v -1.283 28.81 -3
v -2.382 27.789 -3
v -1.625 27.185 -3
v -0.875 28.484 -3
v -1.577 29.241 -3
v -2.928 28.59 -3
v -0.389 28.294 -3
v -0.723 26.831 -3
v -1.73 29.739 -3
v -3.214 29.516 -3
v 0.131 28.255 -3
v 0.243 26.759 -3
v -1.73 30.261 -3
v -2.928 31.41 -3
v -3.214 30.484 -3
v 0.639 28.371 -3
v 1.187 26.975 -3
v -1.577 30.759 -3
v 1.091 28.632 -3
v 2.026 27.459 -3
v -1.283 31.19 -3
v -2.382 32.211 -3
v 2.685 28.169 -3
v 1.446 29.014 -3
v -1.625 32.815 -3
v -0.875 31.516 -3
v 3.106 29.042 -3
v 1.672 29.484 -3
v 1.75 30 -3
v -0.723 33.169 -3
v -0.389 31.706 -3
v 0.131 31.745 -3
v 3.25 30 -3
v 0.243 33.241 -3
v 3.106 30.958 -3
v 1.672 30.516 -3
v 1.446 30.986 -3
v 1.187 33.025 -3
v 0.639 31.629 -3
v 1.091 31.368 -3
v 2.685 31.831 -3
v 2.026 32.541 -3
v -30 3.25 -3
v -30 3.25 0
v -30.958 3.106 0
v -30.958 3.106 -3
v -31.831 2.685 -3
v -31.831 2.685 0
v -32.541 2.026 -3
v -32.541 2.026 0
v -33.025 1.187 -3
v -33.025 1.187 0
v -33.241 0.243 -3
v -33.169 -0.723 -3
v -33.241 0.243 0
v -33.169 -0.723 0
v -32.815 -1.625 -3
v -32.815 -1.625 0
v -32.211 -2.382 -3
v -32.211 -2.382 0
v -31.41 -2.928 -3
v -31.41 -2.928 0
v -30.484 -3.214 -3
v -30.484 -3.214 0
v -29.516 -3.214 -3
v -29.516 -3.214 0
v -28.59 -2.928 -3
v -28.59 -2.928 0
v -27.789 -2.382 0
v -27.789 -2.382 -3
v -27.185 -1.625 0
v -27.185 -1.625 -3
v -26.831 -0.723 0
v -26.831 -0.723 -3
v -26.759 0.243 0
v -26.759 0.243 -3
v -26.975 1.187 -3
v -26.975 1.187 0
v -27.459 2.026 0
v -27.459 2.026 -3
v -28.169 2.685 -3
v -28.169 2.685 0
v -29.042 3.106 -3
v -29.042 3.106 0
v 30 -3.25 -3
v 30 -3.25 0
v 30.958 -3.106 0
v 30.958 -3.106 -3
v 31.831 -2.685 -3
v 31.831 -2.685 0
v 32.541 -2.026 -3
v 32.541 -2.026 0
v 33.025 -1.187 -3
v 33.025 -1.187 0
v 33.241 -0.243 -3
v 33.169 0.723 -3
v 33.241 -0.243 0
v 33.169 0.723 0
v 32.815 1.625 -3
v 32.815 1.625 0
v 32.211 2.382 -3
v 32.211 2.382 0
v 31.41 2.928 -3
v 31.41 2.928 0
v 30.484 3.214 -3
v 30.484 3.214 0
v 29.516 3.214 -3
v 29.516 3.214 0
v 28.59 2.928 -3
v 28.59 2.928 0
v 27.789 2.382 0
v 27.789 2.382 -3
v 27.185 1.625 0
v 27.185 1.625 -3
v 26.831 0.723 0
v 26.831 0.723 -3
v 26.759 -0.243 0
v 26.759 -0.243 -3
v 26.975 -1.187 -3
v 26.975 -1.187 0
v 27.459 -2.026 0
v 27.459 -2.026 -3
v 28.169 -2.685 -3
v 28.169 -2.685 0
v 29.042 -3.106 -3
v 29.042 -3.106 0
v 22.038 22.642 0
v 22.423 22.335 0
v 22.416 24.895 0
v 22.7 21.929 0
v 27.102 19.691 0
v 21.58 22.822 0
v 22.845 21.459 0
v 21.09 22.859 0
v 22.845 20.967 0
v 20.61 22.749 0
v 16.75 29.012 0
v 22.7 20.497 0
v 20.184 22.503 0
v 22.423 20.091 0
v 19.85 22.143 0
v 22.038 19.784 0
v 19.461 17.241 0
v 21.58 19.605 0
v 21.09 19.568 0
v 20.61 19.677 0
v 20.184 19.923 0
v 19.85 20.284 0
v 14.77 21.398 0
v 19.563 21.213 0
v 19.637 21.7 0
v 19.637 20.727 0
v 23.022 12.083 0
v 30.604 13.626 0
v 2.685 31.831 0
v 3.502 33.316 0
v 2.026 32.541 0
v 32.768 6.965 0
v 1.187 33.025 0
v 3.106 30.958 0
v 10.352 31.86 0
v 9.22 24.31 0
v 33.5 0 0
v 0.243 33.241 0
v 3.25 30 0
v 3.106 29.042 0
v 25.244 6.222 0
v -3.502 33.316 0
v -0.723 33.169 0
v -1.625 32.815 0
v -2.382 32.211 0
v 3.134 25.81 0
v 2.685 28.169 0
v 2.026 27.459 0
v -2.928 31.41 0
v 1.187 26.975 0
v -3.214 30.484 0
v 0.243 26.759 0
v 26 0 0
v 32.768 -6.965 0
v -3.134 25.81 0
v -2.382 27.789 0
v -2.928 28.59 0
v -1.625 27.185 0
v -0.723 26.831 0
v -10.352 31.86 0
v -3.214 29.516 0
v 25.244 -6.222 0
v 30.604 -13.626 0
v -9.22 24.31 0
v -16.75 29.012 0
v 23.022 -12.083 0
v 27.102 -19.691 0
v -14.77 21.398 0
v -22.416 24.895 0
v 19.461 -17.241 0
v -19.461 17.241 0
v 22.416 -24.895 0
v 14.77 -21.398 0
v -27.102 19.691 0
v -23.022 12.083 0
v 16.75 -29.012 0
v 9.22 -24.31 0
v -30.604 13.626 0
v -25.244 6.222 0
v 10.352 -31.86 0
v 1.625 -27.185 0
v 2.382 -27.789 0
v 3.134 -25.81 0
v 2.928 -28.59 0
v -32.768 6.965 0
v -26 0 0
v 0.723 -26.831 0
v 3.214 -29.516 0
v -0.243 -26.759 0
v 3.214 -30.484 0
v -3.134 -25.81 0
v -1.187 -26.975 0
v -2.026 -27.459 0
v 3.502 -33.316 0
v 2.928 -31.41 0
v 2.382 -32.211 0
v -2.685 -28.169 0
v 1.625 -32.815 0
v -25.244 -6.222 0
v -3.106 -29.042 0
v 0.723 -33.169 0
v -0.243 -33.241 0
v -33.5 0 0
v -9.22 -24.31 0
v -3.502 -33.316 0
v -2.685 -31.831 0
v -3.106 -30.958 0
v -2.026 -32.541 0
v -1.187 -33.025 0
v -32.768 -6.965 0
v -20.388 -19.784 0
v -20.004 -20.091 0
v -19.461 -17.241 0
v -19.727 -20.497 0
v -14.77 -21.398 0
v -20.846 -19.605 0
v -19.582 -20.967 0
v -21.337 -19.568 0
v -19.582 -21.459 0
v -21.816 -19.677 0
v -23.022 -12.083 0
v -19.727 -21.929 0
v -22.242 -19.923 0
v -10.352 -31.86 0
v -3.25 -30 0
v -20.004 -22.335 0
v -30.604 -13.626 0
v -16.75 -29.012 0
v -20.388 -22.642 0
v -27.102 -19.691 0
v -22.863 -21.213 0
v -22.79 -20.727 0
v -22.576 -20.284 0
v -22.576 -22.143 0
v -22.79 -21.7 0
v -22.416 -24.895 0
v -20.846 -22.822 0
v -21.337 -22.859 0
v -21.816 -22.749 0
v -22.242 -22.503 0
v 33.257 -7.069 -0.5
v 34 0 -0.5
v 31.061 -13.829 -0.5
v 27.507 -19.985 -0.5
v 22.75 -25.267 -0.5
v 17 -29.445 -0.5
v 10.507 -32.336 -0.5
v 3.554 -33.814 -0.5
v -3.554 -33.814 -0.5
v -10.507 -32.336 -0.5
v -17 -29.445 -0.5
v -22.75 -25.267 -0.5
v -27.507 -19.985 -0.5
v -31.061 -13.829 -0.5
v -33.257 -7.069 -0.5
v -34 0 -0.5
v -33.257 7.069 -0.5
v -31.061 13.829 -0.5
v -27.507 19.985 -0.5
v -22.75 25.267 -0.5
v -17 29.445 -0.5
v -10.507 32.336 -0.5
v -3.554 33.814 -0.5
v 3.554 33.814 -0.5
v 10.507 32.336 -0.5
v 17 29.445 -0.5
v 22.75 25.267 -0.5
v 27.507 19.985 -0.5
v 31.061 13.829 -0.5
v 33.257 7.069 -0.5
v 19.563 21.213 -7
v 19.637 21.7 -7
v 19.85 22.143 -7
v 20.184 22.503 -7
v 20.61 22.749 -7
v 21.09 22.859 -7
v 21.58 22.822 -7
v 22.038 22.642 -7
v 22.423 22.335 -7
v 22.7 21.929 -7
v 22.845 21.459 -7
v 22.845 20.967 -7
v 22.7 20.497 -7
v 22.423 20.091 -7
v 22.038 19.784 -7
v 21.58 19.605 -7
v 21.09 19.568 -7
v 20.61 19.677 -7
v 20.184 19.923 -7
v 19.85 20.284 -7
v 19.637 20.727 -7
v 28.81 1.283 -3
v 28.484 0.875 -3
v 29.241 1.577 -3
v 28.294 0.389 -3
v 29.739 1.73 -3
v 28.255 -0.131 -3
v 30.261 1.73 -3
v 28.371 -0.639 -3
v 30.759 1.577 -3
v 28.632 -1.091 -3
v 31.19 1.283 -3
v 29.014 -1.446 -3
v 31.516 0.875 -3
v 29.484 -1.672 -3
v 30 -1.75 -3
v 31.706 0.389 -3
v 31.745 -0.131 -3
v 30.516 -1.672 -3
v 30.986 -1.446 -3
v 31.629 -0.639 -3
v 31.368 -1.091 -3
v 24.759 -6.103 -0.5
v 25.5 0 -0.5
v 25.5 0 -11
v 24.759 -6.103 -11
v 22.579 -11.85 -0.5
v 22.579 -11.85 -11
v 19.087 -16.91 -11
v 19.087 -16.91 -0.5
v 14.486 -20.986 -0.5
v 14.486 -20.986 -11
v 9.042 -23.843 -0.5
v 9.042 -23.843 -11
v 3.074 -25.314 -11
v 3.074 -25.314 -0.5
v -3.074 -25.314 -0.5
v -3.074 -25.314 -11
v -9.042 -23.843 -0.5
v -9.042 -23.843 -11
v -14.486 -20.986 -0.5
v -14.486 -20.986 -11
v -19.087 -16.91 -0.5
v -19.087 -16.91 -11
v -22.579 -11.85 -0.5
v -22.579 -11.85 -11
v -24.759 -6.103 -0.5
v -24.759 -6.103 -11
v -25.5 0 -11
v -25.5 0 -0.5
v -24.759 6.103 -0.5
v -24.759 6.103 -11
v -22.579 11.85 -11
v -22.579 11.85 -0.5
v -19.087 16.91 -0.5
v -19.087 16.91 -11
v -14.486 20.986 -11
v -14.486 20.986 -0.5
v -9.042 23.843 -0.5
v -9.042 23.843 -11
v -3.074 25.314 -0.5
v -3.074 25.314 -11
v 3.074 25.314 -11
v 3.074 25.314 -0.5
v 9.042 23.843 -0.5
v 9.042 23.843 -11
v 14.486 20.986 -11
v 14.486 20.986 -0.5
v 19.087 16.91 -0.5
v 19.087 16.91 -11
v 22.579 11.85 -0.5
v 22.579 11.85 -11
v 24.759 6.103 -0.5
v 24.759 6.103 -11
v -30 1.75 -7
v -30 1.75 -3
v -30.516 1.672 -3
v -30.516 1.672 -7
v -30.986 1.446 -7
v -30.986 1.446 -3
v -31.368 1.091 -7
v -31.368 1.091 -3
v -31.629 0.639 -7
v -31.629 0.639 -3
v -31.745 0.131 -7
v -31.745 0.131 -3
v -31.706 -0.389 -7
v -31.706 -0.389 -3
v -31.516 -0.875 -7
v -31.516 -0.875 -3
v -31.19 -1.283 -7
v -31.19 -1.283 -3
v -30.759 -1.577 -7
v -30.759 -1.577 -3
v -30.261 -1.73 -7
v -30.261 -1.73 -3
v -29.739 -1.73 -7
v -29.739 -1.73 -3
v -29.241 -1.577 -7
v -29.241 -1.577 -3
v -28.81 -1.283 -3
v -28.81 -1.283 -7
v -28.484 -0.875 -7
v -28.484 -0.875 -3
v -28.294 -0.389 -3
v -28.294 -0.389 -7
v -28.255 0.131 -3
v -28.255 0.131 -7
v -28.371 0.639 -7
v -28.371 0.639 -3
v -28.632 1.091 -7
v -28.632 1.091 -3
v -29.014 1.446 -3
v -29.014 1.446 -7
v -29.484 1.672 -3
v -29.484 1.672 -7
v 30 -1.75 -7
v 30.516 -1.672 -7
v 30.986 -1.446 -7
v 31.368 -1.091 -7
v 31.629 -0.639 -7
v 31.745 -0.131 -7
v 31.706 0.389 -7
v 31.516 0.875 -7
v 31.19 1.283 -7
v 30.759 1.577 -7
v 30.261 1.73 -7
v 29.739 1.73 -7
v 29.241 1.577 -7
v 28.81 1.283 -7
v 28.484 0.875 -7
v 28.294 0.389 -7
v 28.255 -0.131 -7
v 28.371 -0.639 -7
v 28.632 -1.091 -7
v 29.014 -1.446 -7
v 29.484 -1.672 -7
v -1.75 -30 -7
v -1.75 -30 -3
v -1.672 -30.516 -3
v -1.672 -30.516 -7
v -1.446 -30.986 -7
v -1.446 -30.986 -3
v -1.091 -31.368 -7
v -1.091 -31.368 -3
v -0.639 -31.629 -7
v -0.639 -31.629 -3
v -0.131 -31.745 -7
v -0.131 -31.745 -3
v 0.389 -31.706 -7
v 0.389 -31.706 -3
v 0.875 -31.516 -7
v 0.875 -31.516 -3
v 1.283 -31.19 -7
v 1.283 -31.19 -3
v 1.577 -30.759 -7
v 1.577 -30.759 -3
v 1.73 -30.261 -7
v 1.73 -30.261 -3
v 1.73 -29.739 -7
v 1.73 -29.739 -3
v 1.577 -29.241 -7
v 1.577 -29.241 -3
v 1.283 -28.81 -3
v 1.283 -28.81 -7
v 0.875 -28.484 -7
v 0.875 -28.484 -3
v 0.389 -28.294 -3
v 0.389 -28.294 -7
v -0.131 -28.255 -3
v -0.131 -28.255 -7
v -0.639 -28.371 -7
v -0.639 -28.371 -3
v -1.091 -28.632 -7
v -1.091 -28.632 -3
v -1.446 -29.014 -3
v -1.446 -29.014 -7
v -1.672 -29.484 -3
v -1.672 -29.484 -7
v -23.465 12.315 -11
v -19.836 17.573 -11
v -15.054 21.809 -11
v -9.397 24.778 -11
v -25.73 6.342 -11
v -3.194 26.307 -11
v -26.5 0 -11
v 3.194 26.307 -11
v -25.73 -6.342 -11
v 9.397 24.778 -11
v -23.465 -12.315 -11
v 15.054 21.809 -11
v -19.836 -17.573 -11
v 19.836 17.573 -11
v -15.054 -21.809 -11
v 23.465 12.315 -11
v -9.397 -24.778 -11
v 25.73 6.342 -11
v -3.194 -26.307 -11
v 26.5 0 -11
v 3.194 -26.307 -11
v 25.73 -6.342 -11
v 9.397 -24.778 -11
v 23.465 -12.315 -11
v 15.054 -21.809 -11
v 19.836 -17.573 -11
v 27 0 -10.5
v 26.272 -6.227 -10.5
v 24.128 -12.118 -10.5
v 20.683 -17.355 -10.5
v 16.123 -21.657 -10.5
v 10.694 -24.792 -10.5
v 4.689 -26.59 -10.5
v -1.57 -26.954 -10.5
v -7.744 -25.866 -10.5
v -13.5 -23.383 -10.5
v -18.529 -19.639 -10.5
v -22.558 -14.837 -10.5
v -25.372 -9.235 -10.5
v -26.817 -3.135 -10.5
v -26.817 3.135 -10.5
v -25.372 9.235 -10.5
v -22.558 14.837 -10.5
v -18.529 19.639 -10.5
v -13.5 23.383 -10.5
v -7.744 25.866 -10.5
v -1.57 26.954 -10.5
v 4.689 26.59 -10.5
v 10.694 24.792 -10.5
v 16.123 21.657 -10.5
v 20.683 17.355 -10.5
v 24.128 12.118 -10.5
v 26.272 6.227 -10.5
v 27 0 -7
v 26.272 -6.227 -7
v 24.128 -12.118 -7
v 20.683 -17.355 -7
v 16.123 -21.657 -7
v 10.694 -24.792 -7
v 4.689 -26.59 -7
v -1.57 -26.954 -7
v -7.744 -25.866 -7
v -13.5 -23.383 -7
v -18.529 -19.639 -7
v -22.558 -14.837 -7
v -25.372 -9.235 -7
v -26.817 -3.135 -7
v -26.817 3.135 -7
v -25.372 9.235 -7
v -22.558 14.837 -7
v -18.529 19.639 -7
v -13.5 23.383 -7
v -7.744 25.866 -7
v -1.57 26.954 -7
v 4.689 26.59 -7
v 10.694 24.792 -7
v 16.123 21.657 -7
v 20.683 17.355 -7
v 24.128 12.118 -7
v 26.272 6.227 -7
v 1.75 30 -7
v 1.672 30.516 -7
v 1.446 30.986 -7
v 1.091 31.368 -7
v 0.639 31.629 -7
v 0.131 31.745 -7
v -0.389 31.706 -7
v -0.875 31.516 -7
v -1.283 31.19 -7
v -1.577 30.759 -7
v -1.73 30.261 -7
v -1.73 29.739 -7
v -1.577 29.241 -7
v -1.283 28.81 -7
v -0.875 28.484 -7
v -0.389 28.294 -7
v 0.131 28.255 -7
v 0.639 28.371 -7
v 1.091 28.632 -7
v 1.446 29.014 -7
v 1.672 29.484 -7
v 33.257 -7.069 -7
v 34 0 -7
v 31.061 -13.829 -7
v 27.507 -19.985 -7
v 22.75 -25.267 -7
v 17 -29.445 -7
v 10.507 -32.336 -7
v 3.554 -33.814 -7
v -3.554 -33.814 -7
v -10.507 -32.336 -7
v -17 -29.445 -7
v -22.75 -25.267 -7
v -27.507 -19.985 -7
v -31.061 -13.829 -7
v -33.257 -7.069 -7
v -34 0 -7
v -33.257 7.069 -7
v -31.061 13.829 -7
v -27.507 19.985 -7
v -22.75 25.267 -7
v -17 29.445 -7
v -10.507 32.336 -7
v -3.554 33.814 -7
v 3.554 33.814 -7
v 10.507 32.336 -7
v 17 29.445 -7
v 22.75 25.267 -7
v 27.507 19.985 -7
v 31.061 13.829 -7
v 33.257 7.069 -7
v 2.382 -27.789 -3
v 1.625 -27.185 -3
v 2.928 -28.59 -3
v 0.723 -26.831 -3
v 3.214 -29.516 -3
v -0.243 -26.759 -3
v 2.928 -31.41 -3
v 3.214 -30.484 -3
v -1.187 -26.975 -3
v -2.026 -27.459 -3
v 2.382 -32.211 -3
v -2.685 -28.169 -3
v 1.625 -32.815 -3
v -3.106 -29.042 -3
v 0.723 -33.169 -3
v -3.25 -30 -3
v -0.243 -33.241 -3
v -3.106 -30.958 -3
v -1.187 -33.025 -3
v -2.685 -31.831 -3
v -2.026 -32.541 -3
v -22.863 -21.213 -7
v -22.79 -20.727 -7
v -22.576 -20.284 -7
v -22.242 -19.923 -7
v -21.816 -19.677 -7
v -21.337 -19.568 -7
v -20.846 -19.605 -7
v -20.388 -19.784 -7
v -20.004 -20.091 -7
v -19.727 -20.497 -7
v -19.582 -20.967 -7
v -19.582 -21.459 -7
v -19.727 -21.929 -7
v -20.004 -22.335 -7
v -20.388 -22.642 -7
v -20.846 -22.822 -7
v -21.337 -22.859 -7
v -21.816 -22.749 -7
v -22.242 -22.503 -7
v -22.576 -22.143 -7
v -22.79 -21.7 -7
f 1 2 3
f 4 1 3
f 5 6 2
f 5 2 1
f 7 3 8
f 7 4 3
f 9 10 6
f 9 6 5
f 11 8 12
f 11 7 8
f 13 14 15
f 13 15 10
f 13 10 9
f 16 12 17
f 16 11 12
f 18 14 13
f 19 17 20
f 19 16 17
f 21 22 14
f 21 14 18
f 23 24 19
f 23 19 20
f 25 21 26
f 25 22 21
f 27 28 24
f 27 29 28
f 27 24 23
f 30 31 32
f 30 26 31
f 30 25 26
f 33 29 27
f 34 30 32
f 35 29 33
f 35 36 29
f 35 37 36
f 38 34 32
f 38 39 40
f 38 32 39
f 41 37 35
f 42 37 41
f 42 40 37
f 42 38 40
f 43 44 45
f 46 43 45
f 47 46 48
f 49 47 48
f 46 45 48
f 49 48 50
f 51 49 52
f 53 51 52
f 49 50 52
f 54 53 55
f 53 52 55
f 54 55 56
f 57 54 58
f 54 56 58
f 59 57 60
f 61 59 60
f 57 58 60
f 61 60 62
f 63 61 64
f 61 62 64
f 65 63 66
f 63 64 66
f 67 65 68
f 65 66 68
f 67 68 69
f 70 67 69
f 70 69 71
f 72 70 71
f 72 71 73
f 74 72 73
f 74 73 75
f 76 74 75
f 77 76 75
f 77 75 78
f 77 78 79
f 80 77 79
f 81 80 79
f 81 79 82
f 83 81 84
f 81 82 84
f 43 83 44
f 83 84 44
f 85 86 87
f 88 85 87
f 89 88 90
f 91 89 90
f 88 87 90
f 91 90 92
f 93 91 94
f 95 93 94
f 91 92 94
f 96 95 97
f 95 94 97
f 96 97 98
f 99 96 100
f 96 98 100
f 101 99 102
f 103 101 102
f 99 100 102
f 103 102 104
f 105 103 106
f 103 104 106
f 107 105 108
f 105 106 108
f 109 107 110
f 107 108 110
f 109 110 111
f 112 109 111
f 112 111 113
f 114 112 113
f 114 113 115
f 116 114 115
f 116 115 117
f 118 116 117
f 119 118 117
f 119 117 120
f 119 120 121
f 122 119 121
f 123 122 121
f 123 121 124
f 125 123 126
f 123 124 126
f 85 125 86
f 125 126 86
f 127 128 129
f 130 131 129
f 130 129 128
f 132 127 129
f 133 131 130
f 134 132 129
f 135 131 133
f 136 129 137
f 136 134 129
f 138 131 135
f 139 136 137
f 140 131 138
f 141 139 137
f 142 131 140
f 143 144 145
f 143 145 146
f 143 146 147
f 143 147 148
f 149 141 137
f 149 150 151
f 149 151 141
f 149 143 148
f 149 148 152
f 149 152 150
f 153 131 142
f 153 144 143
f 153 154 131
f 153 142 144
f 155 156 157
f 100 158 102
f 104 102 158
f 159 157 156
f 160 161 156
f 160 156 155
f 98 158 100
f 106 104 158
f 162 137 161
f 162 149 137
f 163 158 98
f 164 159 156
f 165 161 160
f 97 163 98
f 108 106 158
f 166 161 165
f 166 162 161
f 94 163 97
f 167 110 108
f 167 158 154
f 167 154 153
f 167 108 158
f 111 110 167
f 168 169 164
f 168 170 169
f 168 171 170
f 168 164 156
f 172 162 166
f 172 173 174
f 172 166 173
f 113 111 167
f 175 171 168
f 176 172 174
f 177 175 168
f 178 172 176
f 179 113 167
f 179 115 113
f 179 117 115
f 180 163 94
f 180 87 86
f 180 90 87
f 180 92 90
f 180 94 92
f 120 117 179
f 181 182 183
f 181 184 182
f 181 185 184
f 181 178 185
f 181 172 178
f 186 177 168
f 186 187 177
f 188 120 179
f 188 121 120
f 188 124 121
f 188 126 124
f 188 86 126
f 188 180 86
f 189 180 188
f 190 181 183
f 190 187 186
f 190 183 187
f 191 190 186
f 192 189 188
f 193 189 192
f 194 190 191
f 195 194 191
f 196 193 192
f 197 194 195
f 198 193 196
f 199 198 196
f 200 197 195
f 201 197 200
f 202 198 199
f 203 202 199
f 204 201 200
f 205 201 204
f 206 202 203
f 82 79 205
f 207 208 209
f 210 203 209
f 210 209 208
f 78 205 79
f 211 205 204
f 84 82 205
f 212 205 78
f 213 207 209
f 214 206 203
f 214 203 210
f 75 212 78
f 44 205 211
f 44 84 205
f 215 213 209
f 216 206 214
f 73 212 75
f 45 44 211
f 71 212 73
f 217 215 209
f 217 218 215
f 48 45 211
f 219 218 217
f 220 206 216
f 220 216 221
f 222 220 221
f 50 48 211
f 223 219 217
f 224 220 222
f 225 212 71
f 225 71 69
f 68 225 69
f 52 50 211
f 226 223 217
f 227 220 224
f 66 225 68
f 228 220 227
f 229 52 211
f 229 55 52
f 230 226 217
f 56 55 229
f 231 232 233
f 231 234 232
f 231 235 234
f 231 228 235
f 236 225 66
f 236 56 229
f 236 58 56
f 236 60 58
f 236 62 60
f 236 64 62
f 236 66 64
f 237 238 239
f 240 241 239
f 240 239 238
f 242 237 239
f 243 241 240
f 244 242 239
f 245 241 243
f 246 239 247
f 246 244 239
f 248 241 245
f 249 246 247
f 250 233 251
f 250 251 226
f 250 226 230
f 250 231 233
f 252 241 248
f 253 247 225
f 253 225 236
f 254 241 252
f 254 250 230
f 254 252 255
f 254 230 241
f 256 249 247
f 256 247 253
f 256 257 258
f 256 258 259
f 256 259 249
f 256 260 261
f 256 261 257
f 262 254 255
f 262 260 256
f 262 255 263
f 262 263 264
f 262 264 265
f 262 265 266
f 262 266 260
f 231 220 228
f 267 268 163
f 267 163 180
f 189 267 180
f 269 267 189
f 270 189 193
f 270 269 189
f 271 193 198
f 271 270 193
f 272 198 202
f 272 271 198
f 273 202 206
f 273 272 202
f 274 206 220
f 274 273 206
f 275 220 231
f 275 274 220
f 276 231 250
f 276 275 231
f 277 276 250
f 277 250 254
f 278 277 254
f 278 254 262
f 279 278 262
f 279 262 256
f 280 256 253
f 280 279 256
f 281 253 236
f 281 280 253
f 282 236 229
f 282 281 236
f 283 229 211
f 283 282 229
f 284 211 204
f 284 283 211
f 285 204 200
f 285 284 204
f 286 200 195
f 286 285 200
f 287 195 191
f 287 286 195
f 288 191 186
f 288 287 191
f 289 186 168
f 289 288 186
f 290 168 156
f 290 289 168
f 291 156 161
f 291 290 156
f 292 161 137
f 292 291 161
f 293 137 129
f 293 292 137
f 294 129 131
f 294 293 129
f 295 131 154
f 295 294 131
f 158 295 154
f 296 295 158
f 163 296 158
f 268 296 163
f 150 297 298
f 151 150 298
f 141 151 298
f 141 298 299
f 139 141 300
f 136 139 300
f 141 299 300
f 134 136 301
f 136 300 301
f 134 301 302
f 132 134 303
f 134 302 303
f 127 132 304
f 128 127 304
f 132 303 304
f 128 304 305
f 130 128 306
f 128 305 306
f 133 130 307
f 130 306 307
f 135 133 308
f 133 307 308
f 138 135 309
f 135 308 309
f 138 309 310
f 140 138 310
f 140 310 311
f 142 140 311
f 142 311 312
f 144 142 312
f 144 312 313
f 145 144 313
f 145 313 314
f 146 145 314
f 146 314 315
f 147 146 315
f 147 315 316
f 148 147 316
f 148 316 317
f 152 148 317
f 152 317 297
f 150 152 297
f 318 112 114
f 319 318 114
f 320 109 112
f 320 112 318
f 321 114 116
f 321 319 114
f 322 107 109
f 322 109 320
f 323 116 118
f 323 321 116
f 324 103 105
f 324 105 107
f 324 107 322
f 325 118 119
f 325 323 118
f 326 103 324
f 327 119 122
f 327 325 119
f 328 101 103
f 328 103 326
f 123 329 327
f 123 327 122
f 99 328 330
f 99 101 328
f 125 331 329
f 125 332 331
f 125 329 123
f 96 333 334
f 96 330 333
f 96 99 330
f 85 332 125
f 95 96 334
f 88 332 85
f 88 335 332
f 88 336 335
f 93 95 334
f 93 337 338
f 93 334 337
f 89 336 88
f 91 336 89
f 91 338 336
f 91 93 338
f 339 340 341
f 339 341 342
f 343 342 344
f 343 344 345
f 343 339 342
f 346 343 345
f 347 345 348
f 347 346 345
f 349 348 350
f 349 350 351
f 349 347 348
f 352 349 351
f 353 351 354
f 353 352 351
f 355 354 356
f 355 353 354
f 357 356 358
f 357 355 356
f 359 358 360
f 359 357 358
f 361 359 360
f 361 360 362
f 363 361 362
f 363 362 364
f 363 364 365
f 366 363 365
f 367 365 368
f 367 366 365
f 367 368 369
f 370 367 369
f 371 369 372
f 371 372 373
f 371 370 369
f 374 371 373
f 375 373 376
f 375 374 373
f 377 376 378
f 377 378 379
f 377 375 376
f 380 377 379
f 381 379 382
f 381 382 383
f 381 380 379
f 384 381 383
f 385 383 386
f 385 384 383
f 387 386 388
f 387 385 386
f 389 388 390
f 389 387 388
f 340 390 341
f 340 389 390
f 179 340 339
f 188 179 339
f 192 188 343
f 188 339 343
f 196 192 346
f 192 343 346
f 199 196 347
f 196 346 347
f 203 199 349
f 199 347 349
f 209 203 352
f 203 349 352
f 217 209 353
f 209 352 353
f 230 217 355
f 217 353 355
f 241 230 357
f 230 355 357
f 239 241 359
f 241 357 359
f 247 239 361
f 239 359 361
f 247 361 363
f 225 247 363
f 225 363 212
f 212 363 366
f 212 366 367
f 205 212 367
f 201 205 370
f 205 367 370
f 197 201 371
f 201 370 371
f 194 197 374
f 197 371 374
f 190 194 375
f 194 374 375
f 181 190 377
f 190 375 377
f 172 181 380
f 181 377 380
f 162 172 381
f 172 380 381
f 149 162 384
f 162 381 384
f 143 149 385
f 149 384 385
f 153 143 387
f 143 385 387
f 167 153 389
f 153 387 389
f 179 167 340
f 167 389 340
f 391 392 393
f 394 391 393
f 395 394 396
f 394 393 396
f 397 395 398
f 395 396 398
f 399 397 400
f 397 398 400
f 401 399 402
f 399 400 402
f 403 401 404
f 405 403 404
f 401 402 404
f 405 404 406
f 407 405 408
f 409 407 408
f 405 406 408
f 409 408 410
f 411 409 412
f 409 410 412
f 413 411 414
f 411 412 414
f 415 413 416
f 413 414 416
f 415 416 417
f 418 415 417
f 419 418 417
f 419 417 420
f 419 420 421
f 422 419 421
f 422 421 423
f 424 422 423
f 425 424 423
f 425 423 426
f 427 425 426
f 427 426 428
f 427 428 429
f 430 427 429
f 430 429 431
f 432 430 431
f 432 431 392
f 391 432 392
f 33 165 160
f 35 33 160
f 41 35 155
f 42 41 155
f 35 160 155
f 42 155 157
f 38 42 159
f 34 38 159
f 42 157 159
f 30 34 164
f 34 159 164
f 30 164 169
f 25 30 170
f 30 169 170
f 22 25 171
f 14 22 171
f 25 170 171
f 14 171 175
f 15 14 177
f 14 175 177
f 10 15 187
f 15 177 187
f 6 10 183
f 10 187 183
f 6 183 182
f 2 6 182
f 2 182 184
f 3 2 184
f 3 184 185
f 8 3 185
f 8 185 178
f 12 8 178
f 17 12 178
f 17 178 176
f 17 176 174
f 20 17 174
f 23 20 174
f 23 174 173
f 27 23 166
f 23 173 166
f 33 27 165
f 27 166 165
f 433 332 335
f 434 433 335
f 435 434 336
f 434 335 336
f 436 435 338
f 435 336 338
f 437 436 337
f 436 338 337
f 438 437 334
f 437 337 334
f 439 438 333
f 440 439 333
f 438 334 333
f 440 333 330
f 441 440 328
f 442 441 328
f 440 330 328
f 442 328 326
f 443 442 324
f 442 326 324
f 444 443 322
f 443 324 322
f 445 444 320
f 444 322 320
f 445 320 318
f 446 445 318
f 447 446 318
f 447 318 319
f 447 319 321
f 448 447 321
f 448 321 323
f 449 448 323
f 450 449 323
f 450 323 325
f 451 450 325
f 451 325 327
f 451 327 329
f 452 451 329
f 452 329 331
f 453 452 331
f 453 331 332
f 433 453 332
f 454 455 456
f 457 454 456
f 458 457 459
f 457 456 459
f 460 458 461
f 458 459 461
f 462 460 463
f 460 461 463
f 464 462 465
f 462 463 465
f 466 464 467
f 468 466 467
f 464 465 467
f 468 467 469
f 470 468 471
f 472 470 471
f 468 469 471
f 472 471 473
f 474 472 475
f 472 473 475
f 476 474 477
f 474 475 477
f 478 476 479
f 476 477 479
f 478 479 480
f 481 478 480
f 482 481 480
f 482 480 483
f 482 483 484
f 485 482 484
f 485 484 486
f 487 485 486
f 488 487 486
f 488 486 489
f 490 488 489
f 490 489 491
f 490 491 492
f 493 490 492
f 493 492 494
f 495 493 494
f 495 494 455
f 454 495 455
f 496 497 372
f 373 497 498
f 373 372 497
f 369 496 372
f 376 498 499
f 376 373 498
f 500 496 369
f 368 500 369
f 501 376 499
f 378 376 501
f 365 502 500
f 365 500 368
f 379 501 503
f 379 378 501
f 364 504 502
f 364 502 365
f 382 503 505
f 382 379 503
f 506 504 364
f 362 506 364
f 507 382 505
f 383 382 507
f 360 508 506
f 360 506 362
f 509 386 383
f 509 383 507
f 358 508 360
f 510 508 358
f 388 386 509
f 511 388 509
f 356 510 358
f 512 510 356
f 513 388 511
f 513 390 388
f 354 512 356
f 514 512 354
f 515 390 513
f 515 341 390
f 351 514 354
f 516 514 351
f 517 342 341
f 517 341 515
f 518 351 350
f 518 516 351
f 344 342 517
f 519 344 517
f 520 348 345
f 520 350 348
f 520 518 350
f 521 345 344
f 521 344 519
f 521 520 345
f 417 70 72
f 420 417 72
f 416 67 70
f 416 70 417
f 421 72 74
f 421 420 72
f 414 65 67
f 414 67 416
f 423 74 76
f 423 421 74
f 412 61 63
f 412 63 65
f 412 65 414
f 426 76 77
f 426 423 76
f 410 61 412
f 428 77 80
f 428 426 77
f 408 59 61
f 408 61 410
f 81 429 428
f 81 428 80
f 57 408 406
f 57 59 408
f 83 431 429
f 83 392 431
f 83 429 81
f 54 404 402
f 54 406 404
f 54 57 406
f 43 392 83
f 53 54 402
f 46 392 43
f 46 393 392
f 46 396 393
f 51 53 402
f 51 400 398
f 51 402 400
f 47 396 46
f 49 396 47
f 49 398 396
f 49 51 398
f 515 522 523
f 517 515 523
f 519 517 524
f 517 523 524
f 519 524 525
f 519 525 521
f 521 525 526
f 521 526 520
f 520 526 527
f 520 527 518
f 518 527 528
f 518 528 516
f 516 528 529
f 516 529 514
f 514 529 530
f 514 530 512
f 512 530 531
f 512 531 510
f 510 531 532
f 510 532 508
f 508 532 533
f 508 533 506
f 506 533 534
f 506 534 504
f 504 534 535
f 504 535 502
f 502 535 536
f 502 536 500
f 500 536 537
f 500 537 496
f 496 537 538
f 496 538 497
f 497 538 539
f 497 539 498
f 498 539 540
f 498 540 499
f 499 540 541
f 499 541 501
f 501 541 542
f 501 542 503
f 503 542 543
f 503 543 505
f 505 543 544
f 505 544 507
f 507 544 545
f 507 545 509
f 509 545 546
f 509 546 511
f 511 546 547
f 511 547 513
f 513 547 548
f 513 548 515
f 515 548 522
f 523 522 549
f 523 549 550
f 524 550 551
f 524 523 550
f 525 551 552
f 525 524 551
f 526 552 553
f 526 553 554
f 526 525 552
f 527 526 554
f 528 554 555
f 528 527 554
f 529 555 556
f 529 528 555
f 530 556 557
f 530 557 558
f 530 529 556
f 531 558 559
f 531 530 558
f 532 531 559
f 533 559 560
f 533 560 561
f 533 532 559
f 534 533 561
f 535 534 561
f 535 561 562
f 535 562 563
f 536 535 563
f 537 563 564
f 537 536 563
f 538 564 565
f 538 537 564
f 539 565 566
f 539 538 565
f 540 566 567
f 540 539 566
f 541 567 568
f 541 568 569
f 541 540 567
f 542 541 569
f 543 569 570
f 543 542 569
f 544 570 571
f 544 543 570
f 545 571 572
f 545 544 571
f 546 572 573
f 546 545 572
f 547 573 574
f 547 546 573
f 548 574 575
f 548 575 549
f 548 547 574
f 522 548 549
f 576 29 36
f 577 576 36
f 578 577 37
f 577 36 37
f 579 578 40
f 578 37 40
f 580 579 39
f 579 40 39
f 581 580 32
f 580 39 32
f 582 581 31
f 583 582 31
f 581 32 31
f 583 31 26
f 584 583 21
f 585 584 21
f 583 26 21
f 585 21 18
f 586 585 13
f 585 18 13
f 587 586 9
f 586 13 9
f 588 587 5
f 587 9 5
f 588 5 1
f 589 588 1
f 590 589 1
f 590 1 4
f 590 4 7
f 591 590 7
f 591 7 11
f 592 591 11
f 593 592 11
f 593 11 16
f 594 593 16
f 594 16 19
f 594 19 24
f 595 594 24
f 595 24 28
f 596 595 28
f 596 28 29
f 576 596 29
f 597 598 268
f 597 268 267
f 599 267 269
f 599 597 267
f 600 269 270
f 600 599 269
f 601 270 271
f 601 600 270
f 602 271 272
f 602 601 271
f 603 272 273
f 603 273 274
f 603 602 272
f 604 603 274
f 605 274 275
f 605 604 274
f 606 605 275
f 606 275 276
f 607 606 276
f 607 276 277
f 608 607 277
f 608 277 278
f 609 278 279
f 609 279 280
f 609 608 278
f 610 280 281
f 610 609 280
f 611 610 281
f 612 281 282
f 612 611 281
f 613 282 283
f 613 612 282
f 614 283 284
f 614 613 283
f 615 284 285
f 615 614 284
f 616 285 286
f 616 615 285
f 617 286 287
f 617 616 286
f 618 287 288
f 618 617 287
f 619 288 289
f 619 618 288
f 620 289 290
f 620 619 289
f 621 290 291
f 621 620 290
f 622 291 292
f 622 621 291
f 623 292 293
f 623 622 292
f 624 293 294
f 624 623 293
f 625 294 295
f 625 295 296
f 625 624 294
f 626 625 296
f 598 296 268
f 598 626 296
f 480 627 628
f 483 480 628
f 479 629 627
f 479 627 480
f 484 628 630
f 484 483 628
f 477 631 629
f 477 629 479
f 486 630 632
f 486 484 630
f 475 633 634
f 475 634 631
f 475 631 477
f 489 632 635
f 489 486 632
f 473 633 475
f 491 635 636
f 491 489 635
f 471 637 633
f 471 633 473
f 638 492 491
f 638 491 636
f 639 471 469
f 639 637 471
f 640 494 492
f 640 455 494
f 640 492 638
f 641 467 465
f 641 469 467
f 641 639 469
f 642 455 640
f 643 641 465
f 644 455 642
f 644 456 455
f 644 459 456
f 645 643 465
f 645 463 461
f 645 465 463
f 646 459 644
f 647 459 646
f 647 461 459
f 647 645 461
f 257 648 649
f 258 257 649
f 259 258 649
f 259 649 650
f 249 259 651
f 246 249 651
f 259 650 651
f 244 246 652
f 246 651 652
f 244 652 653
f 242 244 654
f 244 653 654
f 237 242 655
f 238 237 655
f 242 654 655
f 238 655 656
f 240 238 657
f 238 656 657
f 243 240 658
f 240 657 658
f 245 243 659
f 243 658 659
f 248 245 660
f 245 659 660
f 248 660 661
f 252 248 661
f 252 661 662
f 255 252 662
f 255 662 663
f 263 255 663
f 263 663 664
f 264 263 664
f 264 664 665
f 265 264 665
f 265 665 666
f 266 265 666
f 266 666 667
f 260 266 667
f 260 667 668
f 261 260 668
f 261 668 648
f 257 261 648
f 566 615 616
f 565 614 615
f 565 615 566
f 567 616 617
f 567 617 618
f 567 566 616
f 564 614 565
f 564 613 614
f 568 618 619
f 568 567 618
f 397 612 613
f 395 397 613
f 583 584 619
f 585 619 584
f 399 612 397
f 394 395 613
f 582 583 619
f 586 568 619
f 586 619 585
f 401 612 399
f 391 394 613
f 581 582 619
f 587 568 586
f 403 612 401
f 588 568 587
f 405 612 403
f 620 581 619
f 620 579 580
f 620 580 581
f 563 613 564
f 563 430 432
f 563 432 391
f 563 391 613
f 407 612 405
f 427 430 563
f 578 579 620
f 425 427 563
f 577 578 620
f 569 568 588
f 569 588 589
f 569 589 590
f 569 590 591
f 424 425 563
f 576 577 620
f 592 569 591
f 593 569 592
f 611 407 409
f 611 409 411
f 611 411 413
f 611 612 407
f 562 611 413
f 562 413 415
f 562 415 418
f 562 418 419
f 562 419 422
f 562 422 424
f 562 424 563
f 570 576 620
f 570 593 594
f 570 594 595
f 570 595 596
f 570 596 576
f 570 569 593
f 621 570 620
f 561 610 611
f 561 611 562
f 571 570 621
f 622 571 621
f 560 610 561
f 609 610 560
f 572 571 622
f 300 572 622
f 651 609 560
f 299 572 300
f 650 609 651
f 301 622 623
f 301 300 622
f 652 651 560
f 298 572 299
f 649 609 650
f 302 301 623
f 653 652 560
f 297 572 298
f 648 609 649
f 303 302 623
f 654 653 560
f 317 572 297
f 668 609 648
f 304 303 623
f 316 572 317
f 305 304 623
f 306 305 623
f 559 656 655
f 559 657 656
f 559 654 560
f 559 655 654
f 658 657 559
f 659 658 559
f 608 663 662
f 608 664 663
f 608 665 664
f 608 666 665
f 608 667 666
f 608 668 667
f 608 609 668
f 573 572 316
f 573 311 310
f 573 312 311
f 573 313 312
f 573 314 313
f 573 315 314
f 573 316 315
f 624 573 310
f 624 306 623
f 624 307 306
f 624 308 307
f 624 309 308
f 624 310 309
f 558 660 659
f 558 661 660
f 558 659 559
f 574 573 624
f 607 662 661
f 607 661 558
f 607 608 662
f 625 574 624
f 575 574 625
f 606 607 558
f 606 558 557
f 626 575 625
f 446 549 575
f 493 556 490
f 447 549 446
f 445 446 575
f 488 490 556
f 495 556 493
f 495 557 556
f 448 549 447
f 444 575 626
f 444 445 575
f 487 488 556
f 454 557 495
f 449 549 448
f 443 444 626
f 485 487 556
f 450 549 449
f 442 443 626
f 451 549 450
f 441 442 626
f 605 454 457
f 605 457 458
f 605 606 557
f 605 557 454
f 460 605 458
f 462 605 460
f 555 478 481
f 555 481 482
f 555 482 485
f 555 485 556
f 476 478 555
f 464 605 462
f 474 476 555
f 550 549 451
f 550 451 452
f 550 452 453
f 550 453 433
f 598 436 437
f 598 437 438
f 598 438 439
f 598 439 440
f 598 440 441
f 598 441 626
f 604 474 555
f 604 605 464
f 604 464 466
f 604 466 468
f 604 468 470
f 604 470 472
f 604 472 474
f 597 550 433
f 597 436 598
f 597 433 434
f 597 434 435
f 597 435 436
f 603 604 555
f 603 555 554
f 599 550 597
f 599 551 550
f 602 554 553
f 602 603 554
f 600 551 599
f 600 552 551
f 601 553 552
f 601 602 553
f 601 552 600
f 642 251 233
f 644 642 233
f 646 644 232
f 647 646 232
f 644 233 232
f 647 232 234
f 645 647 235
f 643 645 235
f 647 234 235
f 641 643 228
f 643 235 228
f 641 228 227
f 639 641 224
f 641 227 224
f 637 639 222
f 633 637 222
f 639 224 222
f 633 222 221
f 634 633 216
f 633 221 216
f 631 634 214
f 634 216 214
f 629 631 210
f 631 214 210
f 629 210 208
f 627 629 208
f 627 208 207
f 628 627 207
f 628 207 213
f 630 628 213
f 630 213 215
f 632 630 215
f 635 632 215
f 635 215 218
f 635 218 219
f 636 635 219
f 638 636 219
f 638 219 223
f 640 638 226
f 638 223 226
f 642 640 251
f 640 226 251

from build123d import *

# Parameters (mm, degrees)
HOLE_WIZARD_M4_1_D       = 3.3
SKETCH_4_R               = 3.25
CUT_EXTRUDE_1_DEPTH      = 3
SKETCH_5_R               = 1.75
CUT_EXTRUDE_2_DEPTH      = 49.744230428
PATTERN_CIRCULAR_1_COUNT = 4
CHAMFER_1_SIZE           = 0.5


with BuildPart() as part:
    # 草圖1 → 旋轉1 (revolve)
    with BuildSketch(Plane(origin=(0, 0, 0), x_dir=(0, 0, -1), z_dir=(1, 0, 0)), mode=Mode.PRIVATE) as revolve_1_sk:
        Polygon((0, 25.5), (0, 34), (7, 34), (7, 27), (11, 27), (11, 25.5), align=None)
    revolve(revolve_1_sk.sketch.rotate(Axis((0, 0, 0), (0, 0, -1)), 90), axis=Axis((0, 0, 0), (0, 0, -1)))

    # M4 螺紋孔1 (through all)
    with Locations(Plane.XY):
        with Locations((21.213203436, 21.213203436), (-21.213203436, -21.213203436)):
            Hole(HOLE_WIZARD_M4_1_D / 2)

    # 草圖4 → 伸長1 (cut)
    with BuildSketch(Plane.XY):
        with Locations((0, 30)):
            Circle(SKETCH_4_R)
    cut_extrude_1 = extrude(amount=-CUT_EXTRUDE_1_DEPTH, mode=Mode.SUBTRACT)

    # 草圖5 → 伸長2 (cut, through all)
    with BuildSketch(Plane.XY.offset(-3)):
        with Locations((0, 30)):
            Circle(SKETCH_5_R)
    cut_extrude_2 = extrude(amount=-CUT_EXTRUDE_2_DEPTH, mode=Mode.SUBTRACT)

    # 環狀複製排列1: 伸長1, 伸長2 ×4 about axis
    pattern_circular_1_axis = Axis((0, 0, 0), (0, 0, 1))
    add([cut_extrude_1.rotate(pattern_circular_1_axis, i * 360 / PATTERN_CIRCULAR_1_COUNT) for i in range(1, PATTERN_CIRCULAR_1_COUNT)], mode=Mode.SUBTRACT)
    add([cut_extrude_2.rotate(pattern_circular_1_axis, i * 360 / PATTERN_CIRCULAR_1_COUNT) for i in range(1, PATTERN_CIRCULAR_1_COUNT)], mode=Mode.SUBTRACT)

    # 導角1
    chamfer_1_edges = [part.edges().sort_by_distance(p)[0] for p in [
        (-34, 0, 0),
        (-25.5, 0, 0),
        (-27, 0, -11),
    ]]
    chamfer(chamfer_1_edges, length=CHAMFER_1_SIZE)


solid = part.part
